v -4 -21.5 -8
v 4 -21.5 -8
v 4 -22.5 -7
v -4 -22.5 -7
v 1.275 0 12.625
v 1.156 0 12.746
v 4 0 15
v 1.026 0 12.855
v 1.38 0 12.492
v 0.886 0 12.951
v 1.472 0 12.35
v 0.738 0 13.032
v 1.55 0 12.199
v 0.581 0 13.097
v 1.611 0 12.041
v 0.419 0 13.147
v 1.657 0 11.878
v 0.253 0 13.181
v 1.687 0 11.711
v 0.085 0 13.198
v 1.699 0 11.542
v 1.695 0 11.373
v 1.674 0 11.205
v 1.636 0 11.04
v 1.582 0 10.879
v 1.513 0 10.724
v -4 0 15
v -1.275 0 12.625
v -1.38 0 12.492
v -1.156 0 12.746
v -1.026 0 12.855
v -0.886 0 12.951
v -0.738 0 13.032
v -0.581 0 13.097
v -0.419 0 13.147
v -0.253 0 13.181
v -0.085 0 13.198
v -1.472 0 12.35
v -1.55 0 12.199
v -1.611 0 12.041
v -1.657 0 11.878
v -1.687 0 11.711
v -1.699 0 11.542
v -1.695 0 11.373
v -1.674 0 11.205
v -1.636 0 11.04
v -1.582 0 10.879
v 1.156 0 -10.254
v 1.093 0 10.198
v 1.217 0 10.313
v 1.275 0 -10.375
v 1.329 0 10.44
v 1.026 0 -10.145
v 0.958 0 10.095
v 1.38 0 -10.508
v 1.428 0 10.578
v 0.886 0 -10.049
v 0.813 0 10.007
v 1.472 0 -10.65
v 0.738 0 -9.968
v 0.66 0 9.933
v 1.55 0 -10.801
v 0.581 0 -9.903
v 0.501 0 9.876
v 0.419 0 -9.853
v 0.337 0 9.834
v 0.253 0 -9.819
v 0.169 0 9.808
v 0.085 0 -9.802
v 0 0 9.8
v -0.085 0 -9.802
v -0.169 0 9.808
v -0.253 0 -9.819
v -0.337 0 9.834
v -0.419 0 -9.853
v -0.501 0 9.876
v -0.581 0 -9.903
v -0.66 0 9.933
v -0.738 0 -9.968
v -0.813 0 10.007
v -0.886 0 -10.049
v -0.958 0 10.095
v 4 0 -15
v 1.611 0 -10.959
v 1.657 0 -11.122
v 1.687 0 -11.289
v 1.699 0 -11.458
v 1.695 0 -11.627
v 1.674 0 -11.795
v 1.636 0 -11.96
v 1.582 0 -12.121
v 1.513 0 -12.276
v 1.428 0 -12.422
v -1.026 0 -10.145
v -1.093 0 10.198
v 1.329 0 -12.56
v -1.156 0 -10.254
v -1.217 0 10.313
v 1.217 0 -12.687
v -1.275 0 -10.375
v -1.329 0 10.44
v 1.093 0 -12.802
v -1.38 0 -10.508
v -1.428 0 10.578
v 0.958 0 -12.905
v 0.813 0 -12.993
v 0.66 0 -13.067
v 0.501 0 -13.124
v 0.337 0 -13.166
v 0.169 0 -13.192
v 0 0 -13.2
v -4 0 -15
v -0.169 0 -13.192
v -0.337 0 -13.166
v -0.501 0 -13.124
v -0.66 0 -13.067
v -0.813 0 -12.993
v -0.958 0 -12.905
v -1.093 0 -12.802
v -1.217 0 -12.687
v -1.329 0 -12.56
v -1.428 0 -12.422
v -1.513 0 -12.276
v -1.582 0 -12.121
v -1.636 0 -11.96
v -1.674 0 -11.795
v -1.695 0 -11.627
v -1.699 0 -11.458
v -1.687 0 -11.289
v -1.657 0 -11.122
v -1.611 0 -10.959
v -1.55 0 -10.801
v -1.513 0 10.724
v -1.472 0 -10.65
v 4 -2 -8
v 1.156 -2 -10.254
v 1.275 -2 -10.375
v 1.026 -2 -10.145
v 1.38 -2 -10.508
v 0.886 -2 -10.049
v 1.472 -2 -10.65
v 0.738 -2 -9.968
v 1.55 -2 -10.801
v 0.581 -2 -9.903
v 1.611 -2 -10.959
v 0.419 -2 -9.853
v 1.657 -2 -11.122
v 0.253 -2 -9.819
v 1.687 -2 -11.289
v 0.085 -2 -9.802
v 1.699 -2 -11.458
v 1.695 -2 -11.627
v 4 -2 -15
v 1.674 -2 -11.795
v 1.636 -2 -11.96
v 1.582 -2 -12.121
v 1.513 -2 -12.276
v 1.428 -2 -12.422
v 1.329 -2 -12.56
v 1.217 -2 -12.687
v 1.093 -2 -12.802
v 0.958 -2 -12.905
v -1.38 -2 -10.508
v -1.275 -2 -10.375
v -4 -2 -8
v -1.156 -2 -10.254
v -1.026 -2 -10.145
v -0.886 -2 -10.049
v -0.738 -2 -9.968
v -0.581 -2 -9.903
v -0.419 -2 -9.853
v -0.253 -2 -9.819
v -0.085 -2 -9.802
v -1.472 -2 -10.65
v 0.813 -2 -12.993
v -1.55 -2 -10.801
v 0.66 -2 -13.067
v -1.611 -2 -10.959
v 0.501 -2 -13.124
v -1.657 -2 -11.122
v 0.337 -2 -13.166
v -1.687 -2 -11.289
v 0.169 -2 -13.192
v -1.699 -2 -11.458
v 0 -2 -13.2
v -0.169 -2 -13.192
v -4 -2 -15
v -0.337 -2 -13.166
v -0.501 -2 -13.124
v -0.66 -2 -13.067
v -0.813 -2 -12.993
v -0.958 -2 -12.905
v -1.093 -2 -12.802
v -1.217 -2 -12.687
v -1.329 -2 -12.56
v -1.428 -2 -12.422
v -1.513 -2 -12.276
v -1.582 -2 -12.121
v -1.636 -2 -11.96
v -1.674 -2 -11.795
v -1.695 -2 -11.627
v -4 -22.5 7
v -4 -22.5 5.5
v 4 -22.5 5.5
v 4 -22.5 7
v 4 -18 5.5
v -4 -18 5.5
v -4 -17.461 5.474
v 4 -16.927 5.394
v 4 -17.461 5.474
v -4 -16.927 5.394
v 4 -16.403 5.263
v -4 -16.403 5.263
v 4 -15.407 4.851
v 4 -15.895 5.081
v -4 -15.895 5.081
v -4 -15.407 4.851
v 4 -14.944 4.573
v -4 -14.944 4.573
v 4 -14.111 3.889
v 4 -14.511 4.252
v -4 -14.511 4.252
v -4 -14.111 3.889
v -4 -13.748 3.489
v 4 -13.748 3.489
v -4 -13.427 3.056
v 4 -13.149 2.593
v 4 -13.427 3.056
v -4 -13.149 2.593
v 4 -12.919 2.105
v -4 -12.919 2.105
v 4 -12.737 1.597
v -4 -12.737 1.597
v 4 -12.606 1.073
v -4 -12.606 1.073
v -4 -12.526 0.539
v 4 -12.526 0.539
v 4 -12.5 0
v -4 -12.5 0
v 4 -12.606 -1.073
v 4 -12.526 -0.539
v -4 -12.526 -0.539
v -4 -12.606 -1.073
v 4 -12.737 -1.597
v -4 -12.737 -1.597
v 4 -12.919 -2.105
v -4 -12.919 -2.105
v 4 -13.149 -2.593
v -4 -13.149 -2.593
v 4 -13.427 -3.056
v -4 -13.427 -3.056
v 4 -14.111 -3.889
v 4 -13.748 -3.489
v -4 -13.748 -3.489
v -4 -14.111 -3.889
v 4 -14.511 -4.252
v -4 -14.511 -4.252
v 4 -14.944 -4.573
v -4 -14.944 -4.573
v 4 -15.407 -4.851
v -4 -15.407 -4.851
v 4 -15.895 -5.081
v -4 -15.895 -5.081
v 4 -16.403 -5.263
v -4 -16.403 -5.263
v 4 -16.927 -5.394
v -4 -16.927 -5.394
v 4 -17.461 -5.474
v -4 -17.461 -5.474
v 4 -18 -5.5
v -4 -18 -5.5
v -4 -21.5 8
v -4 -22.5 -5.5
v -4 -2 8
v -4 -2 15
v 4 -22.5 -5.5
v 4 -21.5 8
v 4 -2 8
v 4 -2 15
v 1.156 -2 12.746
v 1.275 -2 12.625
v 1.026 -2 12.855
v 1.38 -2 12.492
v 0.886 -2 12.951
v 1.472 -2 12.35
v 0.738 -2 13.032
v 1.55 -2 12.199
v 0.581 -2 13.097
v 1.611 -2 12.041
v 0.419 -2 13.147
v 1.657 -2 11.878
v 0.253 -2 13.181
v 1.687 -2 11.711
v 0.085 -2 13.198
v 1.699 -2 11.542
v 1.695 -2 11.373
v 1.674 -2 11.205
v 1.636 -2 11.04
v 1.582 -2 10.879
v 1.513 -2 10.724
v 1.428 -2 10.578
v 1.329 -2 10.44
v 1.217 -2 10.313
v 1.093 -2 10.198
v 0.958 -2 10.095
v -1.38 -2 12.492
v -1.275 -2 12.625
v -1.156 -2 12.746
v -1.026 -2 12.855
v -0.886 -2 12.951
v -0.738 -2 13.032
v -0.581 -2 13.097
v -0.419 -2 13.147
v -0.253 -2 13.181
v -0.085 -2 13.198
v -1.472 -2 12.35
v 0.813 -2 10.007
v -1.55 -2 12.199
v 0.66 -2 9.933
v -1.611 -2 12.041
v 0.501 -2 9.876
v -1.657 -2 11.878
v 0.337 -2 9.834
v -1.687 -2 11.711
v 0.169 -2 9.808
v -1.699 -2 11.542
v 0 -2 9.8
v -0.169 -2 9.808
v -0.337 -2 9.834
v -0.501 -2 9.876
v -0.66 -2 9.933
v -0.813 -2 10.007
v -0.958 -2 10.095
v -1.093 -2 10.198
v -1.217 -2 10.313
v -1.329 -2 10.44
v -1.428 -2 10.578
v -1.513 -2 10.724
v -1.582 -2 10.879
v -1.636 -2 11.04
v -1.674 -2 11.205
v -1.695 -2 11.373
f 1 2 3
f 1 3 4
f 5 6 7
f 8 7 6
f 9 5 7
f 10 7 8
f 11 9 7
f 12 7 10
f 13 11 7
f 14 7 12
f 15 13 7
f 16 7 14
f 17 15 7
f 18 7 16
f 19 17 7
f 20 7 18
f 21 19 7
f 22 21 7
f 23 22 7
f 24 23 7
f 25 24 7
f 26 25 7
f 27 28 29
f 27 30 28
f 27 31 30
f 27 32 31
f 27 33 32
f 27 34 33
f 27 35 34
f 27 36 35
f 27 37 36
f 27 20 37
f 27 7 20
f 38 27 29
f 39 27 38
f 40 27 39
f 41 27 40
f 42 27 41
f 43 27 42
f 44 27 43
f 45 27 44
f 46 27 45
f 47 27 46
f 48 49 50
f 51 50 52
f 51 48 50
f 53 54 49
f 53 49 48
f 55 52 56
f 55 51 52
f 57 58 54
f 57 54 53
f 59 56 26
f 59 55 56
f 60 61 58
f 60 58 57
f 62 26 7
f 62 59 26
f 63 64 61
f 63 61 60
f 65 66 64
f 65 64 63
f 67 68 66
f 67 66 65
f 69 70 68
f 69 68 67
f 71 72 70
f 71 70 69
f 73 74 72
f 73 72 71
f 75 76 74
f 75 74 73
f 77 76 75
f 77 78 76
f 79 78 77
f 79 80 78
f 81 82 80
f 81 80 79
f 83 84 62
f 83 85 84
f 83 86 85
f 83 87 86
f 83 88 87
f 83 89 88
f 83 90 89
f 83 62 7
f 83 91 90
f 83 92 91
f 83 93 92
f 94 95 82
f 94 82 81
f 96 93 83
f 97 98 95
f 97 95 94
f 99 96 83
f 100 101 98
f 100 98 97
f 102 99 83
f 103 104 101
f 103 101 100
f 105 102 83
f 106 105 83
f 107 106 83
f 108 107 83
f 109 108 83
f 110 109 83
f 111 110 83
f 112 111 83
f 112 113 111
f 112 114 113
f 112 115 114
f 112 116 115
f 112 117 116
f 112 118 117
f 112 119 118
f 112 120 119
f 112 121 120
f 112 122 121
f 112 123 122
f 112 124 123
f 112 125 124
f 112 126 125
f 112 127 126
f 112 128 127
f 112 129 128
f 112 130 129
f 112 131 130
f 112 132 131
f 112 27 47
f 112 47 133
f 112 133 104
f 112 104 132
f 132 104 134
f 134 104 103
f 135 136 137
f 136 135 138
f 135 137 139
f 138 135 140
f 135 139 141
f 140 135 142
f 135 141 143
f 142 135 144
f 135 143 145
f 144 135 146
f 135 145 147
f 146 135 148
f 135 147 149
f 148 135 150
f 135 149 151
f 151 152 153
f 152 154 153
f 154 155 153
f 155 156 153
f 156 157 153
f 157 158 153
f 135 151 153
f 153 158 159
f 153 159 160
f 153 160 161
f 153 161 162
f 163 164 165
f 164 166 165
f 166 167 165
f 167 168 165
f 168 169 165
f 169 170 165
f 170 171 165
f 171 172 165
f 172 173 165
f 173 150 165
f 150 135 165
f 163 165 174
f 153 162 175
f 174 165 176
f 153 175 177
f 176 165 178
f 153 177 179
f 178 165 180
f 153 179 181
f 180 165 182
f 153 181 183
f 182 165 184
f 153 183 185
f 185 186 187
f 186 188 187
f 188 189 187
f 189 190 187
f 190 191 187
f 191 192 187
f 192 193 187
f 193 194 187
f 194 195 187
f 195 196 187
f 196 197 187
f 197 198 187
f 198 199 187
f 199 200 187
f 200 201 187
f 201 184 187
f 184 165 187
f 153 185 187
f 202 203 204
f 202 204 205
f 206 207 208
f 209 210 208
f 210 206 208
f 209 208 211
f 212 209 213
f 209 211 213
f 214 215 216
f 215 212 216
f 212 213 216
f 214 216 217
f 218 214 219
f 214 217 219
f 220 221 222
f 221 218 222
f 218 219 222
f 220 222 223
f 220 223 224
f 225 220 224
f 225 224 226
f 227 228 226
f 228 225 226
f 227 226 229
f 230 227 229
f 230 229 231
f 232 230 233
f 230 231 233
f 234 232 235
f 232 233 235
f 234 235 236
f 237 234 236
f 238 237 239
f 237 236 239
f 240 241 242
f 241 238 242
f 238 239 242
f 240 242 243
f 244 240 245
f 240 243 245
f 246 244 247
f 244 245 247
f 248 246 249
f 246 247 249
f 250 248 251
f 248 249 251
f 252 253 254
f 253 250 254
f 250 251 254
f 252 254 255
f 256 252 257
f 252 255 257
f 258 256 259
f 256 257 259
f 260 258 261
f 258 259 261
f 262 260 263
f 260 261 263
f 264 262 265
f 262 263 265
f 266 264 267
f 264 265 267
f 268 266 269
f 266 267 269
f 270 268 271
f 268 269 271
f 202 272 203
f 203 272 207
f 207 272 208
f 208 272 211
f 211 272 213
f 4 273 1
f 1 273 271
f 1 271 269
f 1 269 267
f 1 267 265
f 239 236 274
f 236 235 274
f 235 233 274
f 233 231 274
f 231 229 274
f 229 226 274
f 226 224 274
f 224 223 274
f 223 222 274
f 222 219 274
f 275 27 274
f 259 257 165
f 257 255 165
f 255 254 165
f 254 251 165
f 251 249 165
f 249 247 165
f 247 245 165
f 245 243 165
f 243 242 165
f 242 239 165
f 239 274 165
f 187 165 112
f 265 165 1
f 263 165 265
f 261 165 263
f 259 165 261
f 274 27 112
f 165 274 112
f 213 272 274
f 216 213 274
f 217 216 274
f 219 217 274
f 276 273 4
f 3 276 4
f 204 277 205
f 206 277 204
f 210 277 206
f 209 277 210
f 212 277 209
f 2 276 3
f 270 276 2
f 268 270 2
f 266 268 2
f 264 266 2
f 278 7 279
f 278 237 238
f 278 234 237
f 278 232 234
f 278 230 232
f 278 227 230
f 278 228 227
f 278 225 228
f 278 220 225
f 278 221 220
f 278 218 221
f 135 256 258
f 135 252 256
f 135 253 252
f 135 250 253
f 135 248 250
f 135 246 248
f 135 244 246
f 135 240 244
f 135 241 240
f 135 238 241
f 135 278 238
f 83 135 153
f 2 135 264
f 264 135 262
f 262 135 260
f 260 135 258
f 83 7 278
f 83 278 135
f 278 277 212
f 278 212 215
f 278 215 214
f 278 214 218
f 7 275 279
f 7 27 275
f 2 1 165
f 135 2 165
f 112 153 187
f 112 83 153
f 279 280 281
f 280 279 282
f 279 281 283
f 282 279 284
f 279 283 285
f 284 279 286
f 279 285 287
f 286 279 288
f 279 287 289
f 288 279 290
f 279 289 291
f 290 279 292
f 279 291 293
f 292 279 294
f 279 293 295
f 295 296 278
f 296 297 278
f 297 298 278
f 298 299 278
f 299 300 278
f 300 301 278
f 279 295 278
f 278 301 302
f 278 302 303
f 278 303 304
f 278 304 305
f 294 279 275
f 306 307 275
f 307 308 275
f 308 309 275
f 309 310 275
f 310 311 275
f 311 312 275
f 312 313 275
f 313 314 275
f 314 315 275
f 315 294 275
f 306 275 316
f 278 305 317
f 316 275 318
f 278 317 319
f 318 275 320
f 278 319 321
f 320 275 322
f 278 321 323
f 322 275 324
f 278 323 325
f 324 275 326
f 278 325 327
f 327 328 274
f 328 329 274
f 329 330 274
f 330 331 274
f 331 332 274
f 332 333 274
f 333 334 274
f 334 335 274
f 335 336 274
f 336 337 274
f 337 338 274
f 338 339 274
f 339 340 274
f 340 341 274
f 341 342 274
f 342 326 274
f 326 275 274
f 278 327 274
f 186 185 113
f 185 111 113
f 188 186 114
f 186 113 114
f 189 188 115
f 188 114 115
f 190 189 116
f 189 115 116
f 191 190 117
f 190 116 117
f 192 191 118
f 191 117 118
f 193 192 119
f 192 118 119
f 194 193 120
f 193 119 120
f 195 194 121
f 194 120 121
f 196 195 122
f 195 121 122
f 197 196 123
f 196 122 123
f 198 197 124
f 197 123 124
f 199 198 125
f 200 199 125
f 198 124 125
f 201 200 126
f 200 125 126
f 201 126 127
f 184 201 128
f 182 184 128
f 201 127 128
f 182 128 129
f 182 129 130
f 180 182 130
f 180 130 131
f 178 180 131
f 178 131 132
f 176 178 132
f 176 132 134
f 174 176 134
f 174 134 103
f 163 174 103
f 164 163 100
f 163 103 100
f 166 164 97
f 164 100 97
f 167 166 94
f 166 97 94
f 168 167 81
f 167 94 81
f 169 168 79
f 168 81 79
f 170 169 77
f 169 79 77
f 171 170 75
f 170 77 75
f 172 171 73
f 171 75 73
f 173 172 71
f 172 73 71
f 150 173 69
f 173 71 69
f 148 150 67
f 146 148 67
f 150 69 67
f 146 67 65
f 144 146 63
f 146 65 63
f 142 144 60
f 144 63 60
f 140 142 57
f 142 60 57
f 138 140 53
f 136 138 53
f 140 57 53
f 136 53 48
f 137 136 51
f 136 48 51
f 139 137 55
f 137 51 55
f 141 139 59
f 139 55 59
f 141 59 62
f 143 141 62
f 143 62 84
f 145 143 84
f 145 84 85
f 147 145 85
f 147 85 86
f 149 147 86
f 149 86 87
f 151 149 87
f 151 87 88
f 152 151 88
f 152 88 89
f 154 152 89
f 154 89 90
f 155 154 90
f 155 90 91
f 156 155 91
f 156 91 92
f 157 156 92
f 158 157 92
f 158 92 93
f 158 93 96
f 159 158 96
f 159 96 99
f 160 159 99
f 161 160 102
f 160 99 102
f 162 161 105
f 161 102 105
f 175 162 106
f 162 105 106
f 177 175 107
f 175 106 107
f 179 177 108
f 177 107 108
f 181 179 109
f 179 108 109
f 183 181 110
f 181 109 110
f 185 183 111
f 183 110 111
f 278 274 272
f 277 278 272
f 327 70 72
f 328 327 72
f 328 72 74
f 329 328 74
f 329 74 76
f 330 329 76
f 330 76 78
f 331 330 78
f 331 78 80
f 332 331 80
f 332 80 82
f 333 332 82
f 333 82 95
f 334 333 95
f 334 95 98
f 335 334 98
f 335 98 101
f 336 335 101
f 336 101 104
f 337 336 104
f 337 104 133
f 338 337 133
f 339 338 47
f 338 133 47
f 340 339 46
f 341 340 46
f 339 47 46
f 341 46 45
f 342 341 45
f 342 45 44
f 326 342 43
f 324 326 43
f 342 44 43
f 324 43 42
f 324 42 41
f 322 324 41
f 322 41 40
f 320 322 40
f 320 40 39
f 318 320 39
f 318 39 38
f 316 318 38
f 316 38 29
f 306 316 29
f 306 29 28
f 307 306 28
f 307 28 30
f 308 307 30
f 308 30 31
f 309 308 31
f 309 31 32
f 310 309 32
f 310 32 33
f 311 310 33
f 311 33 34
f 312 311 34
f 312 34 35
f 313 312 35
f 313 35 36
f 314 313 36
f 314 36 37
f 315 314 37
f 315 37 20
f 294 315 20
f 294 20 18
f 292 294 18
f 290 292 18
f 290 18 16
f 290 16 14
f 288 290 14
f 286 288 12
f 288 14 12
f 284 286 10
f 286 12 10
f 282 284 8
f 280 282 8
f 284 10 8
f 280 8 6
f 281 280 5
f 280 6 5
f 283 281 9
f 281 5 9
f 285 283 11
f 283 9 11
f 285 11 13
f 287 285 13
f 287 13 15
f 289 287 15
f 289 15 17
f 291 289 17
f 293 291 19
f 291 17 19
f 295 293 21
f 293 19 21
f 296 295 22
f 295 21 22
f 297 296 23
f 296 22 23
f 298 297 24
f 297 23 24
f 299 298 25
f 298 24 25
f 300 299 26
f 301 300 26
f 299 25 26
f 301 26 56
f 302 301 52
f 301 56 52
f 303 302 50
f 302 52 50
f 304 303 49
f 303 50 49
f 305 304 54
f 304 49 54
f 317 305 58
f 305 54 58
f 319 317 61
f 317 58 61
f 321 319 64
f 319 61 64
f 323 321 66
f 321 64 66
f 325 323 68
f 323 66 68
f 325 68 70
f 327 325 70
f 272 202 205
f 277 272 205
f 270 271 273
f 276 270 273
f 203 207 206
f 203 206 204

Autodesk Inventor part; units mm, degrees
ref_plane "YZ Plane" through (0, 0, 0) normal (1, 0, 0) x (0, 1, 0)
ref_plane "XZ Plane" through (0, 0, 0) normal (0, 1, 0) x (-1, 0, 0)
ref_plane "XY Plane" through (0, 0, 0) normal (0, 0, 1) x (1, 0, 0)
sketch "Sketch2" plane through (0, 0, 0) normal (1, 0, 0) x (0, 0, -1)
  line L0 (0, 0) -> (0, -18) construction
  line L1 (-8, 0) -> (-8, -18)
  line L2 (8, -18) -> (8, 0)
  arc A0 (8, 0) -> (-8, 0) centre (0, 0) ccw construction
  arc A1 (-8, -18) -> (8, -18) centre (0, -18) ccw construction
  arc A2 (5.5, -18) -> (-5.5, -18) centre (0, -18) ccw
  circle A3 centre (0, -18) radius 4.5 construction
  line L3 (-8, 0) -> (8, 0)
  line L4 (8, -18) -> (5.5, -18)
  arc A4 (-5.5, -18) -> (0, -23.5) centre (0, -18) ccw construction
  arc A5 (0, -23.5) -> (5.5, -18) centre (0, -18) ccw construction
  line L5 (-5.5, -18) -> (-8, -18)
  line L6 (5.5, -18) -> (-5.5, -18) construction
  line L7 (8, -18) -> (5.5, -18)
  line L8 (5.5, -18) -> (5.5, -22.5)
  line L9 (5.5, -22.5) -> (8, -22.5)
  line L10 (8, -22.5) -> (8, -18)
  line L11 (-8, -18) -> (-5.5, -18)
  line L12 (-5.5, -18) -> (-5.5, -22.5)
  line L13 (-5.5, -22.5) -> (-8, -22.5)
  line L14 (-8, -22.5) -> (-8, -18)
  point P0 (0, -9)
  dimension "d2" = 2.5
  dimension "d3" = 9
  dimension "d4" = 1
  dimension "d5" = 18
  dimension "d18" = 4.5
extrude "Extrusion1" add sketch "Sketch2" along normal mid plane 8
sketch "Sketch3" plane through (4, 0, 8) normal (0, 1, 0) x (0, 0, -1)
  line L0 (-7, 0) -> (23, 0)
  line L1 (23, 0) -> (23, 8)
  line L2 (23, 8) -> (-7, 8)
  line L3 (-7, 8) -> (-7, 0)
  line L4 (-7, 0) -> (23, 8) construction
  line L5 (23, 0) -> (-7, 8) construction
  line L6 (0, 8) -> (16, 8) projected
  line L7 (0, 8) -> (0, 0) projected
  point P0 (8, 4)
  dimension "d8" = 7
extrude "Extrusion2" add sketch "Sketch3" against normal blind 2
sketch "Sketch4" plane through (4, -2, 8) normal (0, -1, 0) x (0, 0, -1)
  line L0 (23, 0) -> (23, -8) projected
  line L1 (23, -8) -> (16, -8) projected
  line L2 (16, -8) -> (0, -8) projected
  line L3 (0, -8) -> (0, 0) projected
  line L4 (-7, 0) -> (0, 0) projected
  line L5 (-7, -8) -> (-7, 0) projected
  line L6 (0, -8) -> (-7, -8) projected
  line L7 (16, 0) -> (23, 0) projected
  line L8 (16, 0) -> (16, -8) projected
  line L9 (0, 0) -> (16, 0) projected
  point P0 (19.5, -4)
  point P1 (19.5, -8)
  point P2 (23, -4)
  point P3 (-3.5, -4)
  point P4 (-7, -4)
  point P5 (-3.5, -8)
hole "Hole1" at (0, -2, -11.5) at (0, -2, 11.5) direction (0, 1, 0) diameter 3.4 end through all
chamfer "Chamfer1" distance 1 angle 45 2 edges at (0, -22.5, -8) (0, -22.5, 8)
equation "\"d18\" = 0.5 * d3"
properties part number "differential stopper"
